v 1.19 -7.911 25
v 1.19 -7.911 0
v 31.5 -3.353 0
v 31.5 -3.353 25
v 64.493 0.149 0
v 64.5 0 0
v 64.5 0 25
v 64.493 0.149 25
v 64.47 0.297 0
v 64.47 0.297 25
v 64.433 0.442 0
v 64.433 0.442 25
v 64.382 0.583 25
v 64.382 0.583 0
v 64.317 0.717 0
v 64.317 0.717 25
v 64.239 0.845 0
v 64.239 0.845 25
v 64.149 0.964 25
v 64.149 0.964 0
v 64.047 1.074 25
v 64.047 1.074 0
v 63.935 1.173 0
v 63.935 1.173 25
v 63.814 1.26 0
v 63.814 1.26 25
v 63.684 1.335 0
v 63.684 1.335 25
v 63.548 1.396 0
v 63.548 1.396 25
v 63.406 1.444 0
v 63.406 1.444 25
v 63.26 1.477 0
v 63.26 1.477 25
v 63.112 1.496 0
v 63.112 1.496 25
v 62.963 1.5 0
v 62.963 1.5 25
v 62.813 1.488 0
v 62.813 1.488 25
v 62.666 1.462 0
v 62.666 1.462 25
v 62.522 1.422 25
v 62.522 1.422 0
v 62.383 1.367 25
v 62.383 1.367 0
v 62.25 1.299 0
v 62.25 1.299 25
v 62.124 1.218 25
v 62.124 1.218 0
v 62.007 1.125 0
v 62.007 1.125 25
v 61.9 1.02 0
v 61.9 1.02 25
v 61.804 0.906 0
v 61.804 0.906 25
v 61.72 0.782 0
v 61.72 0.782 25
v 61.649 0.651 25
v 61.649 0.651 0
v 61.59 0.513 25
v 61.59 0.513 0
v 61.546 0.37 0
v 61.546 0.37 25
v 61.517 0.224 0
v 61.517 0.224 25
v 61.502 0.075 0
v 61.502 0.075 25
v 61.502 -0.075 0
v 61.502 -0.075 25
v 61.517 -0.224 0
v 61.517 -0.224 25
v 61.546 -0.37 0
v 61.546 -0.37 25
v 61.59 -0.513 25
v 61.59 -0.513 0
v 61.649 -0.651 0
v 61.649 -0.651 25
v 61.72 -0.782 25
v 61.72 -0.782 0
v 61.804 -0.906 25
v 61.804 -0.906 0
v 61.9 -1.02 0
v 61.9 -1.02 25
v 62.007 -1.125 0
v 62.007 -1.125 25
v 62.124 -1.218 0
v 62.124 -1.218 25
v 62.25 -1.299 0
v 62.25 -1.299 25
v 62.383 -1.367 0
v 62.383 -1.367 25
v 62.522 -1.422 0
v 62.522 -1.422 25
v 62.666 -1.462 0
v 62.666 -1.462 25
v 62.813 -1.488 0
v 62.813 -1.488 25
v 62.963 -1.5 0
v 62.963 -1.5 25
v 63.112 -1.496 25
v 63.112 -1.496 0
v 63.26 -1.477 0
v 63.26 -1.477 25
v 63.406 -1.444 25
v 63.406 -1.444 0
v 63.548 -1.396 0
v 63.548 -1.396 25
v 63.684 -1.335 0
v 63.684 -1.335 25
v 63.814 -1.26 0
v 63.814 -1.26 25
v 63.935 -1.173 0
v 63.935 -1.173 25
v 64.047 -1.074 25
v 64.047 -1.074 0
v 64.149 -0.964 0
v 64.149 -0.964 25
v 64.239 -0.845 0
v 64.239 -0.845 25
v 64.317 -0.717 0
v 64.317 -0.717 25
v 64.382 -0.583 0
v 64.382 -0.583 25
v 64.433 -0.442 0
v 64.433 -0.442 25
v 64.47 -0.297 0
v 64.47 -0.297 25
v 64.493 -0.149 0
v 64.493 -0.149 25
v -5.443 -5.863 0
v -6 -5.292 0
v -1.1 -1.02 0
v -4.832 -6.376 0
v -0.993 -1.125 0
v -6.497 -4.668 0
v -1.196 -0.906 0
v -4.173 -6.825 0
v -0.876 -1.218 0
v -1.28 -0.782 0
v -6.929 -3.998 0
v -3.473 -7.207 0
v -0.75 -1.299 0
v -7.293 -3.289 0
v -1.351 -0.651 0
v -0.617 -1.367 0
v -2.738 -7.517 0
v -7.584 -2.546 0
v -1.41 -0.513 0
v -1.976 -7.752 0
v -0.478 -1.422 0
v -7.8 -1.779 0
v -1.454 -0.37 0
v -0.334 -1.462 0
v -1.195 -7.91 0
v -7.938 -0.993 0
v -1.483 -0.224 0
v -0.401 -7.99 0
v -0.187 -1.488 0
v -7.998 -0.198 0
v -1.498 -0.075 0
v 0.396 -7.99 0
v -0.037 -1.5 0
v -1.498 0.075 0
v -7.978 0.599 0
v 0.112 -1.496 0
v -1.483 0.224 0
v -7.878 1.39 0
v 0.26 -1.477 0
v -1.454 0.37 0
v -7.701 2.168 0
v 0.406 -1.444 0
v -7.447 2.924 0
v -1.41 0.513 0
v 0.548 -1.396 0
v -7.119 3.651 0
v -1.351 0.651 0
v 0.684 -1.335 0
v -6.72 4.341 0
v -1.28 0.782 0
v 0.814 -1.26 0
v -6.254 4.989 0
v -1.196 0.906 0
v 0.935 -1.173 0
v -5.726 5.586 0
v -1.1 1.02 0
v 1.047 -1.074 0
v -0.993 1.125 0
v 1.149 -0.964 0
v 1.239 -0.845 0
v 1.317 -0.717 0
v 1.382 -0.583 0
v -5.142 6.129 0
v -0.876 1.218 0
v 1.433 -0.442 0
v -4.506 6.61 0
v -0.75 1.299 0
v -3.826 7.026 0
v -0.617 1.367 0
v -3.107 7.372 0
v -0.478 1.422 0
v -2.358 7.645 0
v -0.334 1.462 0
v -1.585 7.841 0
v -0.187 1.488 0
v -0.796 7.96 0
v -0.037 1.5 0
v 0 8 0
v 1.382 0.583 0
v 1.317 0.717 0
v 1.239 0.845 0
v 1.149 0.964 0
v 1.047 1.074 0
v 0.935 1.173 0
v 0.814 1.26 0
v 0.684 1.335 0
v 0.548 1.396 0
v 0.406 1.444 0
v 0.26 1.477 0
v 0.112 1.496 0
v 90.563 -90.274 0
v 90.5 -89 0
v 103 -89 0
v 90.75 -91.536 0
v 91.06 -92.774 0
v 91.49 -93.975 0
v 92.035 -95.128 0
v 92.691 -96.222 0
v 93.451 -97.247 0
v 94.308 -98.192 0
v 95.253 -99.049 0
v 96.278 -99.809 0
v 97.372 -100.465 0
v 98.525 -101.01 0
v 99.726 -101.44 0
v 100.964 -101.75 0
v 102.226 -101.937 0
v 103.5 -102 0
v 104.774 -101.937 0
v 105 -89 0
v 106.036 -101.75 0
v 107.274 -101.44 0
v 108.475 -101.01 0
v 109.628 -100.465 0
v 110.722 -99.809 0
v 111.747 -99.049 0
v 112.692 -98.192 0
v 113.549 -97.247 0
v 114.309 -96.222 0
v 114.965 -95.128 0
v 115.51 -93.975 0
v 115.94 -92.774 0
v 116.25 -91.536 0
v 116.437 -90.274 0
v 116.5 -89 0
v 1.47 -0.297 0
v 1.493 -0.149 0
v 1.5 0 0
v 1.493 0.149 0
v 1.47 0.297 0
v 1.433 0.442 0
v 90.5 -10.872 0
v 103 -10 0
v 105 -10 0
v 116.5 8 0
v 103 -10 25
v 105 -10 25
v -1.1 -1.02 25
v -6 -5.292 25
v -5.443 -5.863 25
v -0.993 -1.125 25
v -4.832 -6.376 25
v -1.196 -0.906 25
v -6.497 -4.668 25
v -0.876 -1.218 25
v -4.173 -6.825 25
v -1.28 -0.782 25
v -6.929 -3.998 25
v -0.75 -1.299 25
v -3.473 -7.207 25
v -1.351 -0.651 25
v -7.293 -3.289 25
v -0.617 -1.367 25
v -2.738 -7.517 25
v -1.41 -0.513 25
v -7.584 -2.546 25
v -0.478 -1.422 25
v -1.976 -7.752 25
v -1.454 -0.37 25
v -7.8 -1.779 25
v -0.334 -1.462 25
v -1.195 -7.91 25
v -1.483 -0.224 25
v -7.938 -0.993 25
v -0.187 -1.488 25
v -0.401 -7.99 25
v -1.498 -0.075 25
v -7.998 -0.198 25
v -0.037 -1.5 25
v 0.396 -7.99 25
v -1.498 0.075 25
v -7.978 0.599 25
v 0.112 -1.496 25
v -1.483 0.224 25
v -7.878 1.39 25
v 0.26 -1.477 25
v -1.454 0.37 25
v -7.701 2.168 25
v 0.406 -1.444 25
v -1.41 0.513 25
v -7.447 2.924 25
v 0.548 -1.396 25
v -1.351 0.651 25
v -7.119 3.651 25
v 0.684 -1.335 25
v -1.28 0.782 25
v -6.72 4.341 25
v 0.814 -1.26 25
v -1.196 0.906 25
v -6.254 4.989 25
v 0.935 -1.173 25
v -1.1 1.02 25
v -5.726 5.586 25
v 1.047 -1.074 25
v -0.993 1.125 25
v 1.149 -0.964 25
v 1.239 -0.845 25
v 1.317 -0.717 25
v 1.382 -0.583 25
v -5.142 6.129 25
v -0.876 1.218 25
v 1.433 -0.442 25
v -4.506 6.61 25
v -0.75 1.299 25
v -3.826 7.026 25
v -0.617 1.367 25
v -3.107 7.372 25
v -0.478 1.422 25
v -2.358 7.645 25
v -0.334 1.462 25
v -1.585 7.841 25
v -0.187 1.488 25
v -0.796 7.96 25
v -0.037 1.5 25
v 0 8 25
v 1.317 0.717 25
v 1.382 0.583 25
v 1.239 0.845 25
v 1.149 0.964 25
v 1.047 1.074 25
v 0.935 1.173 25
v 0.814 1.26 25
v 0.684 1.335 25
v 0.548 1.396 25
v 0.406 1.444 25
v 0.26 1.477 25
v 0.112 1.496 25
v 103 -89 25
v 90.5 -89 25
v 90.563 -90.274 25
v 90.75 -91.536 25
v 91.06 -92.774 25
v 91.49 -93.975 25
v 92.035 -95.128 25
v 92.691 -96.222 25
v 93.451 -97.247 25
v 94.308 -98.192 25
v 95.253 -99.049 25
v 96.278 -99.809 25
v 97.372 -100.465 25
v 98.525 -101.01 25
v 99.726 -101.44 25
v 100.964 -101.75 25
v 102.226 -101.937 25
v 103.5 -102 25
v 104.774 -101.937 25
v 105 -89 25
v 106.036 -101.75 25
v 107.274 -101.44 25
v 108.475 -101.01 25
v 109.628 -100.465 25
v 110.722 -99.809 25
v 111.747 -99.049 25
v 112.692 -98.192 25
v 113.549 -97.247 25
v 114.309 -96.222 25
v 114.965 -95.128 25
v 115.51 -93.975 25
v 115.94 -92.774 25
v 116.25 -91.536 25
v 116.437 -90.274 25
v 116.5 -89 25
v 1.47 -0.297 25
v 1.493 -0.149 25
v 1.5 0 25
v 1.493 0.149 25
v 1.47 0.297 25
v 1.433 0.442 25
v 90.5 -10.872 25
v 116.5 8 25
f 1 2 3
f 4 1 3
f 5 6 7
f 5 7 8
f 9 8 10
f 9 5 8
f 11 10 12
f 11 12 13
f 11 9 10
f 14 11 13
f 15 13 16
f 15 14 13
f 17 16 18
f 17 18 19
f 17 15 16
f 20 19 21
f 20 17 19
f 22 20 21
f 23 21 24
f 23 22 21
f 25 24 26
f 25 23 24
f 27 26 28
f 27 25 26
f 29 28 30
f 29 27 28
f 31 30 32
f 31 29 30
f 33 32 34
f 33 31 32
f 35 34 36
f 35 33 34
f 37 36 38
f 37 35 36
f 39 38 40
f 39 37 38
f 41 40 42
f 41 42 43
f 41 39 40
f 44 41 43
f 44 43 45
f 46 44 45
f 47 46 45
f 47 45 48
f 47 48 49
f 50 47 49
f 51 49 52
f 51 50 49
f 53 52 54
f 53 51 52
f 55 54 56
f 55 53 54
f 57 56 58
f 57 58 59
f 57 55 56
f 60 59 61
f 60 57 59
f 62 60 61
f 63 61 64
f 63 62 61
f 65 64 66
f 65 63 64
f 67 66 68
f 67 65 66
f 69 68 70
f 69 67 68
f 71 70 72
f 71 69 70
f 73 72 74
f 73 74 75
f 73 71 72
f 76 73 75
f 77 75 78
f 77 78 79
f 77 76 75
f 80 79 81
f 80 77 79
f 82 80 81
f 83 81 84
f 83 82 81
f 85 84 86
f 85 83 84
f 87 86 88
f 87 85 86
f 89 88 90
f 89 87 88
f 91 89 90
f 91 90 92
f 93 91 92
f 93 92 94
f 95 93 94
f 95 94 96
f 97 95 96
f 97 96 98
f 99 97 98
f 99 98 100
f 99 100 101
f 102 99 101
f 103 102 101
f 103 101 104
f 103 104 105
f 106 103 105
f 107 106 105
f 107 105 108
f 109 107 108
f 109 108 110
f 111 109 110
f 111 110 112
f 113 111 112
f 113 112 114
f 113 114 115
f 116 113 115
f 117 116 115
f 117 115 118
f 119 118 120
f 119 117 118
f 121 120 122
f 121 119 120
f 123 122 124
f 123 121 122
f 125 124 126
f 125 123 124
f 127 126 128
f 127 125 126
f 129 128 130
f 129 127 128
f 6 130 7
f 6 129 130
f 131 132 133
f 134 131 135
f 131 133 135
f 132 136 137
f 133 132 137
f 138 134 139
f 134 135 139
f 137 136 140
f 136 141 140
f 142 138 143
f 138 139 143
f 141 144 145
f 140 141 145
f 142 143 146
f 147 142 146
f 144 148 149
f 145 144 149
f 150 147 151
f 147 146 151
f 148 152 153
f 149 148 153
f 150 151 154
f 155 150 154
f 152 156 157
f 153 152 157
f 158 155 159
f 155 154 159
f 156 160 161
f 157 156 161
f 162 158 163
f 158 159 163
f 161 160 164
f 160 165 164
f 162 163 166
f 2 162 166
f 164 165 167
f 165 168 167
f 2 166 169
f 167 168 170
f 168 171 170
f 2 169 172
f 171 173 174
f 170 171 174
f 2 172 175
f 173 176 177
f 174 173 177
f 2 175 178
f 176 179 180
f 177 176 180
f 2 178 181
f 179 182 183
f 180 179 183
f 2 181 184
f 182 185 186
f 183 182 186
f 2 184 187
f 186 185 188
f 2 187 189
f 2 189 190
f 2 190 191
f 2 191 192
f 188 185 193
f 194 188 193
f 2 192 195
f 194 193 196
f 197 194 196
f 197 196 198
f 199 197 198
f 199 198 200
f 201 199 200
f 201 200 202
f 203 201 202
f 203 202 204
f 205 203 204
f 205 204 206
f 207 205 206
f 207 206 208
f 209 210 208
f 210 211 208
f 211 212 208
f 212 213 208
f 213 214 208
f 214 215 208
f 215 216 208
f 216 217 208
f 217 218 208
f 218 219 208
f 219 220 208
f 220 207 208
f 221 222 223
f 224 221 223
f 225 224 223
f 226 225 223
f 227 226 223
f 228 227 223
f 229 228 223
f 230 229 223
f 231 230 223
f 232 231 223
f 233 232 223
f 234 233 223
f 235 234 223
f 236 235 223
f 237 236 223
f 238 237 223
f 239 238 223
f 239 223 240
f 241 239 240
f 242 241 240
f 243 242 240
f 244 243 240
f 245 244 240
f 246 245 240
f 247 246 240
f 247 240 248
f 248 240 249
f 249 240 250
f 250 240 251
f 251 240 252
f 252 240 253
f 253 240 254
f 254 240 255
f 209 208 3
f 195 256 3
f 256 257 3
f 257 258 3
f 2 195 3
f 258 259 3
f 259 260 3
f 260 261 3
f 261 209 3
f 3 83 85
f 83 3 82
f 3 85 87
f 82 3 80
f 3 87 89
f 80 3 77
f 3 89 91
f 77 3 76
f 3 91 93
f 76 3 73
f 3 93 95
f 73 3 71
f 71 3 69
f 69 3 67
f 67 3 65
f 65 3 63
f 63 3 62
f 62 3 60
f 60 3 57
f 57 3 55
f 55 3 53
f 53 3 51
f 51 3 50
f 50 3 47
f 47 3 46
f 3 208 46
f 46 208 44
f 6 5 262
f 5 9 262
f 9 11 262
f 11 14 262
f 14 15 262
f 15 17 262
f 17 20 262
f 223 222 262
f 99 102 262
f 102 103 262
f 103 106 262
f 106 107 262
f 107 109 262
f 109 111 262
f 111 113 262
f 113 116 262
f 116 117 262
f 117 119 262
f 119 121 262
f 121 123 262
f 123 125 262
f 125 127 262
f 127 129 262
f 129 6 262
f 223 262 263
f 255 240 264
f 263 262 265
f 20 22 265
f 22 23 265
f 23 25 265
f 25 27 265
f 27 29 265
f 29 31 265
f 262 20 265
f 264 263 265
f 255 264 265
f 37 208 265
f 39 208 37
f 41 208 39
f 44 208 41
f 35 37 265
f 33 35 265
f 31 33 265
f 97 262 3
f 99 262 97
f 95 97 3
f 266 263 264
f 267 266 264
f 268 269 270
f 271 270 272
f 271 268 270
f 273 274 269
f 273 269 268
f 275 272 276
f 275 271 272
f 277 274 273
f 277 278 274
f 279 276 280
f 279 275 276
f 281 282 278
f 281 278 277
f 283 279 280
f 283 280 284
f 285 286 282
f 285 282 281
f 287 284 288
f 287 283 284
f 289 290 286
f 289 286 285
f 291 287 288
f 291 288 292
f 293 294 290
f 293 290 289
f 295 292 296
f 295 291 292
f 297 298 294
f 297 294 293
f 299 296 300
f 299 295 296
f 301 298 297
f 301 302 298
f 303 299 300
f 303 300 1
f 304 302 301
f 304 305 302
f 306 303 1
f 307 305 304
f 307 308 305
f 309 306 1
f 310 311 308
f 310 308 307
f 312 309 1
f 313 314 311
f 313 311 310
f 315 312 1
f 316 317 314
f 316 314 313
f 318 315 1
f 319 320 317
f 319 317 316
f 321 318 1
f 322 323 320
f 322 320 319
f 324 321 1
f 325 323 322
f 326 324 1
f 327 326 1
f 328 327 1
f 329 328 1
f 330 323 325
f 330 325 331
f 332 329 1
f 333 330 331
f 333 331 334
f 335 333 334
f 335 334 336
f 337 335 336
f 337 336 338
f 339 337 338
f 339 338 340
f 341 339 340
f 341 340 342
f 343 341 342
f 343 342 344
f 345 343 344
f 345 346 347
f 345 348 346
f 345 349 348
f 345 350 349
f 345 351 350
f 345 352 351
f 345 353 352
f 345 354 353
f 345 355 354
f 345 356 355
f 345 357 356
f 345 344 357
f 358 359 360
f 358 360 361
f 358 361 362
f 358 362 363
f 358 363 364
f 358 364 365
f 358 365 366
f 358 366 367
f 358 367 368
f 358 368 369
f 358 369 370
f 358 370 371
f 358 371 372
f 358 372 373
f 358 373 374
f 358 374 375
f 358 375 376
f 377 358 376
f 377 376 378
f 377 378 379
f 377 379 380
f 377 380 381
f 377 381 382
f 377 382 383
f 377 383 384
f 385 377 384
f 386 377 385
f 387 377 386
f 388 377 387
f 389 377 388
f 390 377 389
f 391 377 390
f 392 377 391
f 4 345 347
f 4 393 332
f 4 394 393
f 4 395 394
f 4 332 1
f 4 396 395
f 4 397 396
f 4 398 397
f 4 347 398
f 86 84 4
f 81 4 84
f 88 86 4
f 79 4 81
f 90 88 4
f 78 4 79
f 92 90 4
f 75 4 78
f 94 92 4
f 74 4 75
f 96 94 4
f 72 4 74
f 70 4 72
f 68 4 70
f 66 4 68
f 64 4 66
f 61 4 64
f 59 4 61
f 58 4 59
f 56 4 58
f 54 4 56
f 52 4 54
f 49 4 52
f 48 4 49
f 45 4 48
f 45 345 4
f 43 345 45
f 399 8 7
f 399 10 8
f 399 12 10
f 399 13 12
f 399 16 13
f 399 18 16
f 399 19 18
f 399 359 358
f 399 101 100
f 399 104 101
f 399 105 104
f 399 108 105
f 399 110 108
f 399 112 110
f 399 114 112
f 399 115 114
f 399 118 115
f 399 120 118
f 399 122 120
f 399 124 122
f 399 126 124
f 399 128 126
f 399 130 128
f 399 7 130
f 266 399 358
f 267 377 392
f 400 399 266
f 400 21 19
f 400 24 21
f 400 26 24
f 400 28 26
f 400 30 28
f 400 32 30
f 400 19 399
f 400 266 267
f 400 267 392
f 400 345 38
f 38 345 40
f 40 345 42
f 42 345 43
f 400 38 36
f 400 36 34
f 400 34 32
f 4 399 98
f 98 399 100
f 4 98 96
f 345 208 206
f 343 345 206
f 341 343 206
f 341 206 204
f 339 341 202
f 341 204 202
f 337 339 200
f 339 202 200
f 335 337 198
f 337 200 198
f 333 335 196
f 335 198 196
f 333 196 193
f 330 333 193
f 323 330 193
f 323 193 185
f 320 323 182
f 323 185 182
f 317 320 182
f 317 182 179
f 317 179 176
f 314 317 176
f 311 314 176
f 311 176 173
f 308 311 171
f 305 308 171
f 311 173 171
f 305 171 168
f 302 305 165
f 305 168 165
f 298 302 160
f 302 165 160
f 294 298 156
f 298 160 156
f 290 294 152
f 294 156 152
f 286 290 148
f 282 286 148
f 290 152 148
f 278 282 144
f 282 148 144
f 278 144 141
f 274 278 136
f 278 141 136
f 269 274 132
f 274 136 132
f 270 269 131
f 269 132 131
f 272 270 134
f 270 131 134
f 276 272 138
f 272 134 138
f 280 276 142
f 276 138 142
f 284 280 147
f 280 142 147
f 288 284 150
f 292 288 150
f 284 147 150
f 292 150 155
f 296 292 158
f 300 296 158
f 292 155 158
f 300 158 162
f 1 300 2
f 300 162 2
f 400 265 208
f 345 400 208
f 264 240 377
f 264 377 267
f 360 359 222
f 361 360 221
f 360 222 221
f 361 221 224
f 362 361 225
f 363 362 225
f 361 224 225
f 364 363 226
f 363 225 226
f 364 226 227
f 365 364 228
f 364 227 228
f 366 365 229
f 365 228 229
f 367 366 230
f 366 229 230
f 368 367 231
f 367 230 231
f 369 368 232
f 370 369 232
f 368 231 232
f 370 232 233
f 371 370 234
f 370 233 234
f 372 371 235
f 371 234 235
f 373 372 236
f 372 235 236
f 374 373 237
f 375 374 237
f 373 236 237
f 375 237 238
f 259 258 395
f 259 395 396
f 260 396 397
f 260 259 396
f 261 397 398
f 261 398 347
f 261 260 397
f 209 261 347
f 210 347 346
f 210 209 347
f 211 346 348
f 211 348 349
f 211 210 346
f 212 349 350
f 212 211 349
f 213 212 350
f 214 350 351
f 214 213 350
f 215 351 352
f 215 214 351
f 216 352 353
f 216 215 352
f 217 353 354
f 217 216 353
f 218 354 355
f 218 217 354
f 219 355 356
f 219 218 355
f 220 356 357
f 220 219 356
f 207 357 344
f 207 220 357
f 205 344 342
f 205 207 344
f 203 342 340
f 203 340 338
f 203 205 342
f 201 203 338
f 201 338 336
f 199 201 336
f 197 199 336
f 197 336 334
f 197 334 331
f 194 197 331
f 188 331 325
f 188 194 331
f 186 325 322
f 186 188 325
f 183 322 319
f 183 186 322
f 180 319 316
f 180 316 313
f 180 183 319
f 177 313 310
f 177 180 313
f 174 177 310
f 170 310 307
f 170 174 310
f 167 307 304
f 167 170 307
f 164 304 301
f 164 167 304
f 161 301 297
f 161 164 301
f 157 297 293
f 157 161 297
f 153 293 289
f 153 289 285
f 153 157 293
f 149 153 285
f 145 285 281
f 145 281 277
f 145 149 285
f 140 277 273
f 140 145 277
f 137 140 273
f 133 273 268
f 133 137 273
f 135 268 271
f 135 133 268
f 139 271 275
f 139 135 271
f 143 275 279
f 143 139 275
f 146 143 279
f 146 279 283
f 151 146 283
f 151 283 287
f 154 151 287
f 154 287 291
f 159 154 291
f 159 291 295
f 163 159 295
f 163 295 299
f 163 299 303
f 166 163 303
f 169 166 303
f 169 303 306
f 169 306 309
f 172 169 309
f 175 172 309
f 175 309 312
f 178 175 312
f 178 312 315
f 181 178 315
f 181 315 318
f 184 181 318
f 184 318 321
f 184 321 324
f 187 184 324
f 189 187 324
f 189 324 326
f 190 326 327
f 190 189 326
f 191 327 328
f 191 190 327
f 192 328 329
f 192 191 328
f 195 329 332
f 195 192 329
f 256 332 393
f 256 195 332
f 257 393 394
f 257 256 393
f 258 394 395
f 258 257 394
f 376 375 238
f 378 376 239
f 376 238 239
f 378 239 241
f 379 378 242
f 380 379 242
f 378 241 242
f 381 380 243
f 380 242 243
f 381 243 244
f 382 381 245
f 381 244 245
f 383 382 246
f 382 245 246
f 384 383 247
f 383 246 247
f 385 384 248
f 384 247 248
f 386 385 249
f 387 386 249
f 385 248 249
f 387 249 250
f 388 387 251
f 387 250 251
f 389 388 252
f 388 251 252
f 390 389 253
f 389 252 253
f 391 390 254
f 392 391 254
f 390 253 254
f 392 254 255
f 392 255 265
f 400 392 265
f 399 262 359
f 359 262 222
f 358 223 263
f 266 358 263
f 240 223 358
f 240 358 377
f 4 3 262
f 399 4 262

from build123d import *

# Parameters (mm, degrees)
F0_W     = 2
F0_H     = 79
F0_R     = 1.5
F1_DEPTH = 25


with BuildPart() as f1:
    # F0 (on Top) → F1 (new body)
    with BuildSketch(Plane.XY):
        with BuildLine():
            Line((116.5, 8), (0, 8))
            ThreePointArc((0, 8), (-7.977735, -0.596449), (1.189577, -7.911062))
            Line((1.189577, -7.911062), (31.5, -3.353319))
            Line((31.5, -3.353319), (90.5, -10.871761))
            Line((90.5, -10.871761), (90.5, -89))
            ThreePointArc((90.5, -89), (94.307612, -98.192388), (103.5, -102))
            ThreePointArc((103.5, -102), (112.692388, -98.192388), (116.5, -89))
            Line((116.5, -89), (116.5, 8))
        make_face()
        with Locations((104, -49.5)):
            Rectangle(F0_W, F0_H, mode=Mode.SUBTRACT)
        Circle(F0_R, mode=Mode.SUBTRACT)
        with Locations((63, 0)):
            Circle(F0_R, mode=Mode.SUBTRACT)
    extrude(amount=F1_DEPTH)


solid = f1.part
